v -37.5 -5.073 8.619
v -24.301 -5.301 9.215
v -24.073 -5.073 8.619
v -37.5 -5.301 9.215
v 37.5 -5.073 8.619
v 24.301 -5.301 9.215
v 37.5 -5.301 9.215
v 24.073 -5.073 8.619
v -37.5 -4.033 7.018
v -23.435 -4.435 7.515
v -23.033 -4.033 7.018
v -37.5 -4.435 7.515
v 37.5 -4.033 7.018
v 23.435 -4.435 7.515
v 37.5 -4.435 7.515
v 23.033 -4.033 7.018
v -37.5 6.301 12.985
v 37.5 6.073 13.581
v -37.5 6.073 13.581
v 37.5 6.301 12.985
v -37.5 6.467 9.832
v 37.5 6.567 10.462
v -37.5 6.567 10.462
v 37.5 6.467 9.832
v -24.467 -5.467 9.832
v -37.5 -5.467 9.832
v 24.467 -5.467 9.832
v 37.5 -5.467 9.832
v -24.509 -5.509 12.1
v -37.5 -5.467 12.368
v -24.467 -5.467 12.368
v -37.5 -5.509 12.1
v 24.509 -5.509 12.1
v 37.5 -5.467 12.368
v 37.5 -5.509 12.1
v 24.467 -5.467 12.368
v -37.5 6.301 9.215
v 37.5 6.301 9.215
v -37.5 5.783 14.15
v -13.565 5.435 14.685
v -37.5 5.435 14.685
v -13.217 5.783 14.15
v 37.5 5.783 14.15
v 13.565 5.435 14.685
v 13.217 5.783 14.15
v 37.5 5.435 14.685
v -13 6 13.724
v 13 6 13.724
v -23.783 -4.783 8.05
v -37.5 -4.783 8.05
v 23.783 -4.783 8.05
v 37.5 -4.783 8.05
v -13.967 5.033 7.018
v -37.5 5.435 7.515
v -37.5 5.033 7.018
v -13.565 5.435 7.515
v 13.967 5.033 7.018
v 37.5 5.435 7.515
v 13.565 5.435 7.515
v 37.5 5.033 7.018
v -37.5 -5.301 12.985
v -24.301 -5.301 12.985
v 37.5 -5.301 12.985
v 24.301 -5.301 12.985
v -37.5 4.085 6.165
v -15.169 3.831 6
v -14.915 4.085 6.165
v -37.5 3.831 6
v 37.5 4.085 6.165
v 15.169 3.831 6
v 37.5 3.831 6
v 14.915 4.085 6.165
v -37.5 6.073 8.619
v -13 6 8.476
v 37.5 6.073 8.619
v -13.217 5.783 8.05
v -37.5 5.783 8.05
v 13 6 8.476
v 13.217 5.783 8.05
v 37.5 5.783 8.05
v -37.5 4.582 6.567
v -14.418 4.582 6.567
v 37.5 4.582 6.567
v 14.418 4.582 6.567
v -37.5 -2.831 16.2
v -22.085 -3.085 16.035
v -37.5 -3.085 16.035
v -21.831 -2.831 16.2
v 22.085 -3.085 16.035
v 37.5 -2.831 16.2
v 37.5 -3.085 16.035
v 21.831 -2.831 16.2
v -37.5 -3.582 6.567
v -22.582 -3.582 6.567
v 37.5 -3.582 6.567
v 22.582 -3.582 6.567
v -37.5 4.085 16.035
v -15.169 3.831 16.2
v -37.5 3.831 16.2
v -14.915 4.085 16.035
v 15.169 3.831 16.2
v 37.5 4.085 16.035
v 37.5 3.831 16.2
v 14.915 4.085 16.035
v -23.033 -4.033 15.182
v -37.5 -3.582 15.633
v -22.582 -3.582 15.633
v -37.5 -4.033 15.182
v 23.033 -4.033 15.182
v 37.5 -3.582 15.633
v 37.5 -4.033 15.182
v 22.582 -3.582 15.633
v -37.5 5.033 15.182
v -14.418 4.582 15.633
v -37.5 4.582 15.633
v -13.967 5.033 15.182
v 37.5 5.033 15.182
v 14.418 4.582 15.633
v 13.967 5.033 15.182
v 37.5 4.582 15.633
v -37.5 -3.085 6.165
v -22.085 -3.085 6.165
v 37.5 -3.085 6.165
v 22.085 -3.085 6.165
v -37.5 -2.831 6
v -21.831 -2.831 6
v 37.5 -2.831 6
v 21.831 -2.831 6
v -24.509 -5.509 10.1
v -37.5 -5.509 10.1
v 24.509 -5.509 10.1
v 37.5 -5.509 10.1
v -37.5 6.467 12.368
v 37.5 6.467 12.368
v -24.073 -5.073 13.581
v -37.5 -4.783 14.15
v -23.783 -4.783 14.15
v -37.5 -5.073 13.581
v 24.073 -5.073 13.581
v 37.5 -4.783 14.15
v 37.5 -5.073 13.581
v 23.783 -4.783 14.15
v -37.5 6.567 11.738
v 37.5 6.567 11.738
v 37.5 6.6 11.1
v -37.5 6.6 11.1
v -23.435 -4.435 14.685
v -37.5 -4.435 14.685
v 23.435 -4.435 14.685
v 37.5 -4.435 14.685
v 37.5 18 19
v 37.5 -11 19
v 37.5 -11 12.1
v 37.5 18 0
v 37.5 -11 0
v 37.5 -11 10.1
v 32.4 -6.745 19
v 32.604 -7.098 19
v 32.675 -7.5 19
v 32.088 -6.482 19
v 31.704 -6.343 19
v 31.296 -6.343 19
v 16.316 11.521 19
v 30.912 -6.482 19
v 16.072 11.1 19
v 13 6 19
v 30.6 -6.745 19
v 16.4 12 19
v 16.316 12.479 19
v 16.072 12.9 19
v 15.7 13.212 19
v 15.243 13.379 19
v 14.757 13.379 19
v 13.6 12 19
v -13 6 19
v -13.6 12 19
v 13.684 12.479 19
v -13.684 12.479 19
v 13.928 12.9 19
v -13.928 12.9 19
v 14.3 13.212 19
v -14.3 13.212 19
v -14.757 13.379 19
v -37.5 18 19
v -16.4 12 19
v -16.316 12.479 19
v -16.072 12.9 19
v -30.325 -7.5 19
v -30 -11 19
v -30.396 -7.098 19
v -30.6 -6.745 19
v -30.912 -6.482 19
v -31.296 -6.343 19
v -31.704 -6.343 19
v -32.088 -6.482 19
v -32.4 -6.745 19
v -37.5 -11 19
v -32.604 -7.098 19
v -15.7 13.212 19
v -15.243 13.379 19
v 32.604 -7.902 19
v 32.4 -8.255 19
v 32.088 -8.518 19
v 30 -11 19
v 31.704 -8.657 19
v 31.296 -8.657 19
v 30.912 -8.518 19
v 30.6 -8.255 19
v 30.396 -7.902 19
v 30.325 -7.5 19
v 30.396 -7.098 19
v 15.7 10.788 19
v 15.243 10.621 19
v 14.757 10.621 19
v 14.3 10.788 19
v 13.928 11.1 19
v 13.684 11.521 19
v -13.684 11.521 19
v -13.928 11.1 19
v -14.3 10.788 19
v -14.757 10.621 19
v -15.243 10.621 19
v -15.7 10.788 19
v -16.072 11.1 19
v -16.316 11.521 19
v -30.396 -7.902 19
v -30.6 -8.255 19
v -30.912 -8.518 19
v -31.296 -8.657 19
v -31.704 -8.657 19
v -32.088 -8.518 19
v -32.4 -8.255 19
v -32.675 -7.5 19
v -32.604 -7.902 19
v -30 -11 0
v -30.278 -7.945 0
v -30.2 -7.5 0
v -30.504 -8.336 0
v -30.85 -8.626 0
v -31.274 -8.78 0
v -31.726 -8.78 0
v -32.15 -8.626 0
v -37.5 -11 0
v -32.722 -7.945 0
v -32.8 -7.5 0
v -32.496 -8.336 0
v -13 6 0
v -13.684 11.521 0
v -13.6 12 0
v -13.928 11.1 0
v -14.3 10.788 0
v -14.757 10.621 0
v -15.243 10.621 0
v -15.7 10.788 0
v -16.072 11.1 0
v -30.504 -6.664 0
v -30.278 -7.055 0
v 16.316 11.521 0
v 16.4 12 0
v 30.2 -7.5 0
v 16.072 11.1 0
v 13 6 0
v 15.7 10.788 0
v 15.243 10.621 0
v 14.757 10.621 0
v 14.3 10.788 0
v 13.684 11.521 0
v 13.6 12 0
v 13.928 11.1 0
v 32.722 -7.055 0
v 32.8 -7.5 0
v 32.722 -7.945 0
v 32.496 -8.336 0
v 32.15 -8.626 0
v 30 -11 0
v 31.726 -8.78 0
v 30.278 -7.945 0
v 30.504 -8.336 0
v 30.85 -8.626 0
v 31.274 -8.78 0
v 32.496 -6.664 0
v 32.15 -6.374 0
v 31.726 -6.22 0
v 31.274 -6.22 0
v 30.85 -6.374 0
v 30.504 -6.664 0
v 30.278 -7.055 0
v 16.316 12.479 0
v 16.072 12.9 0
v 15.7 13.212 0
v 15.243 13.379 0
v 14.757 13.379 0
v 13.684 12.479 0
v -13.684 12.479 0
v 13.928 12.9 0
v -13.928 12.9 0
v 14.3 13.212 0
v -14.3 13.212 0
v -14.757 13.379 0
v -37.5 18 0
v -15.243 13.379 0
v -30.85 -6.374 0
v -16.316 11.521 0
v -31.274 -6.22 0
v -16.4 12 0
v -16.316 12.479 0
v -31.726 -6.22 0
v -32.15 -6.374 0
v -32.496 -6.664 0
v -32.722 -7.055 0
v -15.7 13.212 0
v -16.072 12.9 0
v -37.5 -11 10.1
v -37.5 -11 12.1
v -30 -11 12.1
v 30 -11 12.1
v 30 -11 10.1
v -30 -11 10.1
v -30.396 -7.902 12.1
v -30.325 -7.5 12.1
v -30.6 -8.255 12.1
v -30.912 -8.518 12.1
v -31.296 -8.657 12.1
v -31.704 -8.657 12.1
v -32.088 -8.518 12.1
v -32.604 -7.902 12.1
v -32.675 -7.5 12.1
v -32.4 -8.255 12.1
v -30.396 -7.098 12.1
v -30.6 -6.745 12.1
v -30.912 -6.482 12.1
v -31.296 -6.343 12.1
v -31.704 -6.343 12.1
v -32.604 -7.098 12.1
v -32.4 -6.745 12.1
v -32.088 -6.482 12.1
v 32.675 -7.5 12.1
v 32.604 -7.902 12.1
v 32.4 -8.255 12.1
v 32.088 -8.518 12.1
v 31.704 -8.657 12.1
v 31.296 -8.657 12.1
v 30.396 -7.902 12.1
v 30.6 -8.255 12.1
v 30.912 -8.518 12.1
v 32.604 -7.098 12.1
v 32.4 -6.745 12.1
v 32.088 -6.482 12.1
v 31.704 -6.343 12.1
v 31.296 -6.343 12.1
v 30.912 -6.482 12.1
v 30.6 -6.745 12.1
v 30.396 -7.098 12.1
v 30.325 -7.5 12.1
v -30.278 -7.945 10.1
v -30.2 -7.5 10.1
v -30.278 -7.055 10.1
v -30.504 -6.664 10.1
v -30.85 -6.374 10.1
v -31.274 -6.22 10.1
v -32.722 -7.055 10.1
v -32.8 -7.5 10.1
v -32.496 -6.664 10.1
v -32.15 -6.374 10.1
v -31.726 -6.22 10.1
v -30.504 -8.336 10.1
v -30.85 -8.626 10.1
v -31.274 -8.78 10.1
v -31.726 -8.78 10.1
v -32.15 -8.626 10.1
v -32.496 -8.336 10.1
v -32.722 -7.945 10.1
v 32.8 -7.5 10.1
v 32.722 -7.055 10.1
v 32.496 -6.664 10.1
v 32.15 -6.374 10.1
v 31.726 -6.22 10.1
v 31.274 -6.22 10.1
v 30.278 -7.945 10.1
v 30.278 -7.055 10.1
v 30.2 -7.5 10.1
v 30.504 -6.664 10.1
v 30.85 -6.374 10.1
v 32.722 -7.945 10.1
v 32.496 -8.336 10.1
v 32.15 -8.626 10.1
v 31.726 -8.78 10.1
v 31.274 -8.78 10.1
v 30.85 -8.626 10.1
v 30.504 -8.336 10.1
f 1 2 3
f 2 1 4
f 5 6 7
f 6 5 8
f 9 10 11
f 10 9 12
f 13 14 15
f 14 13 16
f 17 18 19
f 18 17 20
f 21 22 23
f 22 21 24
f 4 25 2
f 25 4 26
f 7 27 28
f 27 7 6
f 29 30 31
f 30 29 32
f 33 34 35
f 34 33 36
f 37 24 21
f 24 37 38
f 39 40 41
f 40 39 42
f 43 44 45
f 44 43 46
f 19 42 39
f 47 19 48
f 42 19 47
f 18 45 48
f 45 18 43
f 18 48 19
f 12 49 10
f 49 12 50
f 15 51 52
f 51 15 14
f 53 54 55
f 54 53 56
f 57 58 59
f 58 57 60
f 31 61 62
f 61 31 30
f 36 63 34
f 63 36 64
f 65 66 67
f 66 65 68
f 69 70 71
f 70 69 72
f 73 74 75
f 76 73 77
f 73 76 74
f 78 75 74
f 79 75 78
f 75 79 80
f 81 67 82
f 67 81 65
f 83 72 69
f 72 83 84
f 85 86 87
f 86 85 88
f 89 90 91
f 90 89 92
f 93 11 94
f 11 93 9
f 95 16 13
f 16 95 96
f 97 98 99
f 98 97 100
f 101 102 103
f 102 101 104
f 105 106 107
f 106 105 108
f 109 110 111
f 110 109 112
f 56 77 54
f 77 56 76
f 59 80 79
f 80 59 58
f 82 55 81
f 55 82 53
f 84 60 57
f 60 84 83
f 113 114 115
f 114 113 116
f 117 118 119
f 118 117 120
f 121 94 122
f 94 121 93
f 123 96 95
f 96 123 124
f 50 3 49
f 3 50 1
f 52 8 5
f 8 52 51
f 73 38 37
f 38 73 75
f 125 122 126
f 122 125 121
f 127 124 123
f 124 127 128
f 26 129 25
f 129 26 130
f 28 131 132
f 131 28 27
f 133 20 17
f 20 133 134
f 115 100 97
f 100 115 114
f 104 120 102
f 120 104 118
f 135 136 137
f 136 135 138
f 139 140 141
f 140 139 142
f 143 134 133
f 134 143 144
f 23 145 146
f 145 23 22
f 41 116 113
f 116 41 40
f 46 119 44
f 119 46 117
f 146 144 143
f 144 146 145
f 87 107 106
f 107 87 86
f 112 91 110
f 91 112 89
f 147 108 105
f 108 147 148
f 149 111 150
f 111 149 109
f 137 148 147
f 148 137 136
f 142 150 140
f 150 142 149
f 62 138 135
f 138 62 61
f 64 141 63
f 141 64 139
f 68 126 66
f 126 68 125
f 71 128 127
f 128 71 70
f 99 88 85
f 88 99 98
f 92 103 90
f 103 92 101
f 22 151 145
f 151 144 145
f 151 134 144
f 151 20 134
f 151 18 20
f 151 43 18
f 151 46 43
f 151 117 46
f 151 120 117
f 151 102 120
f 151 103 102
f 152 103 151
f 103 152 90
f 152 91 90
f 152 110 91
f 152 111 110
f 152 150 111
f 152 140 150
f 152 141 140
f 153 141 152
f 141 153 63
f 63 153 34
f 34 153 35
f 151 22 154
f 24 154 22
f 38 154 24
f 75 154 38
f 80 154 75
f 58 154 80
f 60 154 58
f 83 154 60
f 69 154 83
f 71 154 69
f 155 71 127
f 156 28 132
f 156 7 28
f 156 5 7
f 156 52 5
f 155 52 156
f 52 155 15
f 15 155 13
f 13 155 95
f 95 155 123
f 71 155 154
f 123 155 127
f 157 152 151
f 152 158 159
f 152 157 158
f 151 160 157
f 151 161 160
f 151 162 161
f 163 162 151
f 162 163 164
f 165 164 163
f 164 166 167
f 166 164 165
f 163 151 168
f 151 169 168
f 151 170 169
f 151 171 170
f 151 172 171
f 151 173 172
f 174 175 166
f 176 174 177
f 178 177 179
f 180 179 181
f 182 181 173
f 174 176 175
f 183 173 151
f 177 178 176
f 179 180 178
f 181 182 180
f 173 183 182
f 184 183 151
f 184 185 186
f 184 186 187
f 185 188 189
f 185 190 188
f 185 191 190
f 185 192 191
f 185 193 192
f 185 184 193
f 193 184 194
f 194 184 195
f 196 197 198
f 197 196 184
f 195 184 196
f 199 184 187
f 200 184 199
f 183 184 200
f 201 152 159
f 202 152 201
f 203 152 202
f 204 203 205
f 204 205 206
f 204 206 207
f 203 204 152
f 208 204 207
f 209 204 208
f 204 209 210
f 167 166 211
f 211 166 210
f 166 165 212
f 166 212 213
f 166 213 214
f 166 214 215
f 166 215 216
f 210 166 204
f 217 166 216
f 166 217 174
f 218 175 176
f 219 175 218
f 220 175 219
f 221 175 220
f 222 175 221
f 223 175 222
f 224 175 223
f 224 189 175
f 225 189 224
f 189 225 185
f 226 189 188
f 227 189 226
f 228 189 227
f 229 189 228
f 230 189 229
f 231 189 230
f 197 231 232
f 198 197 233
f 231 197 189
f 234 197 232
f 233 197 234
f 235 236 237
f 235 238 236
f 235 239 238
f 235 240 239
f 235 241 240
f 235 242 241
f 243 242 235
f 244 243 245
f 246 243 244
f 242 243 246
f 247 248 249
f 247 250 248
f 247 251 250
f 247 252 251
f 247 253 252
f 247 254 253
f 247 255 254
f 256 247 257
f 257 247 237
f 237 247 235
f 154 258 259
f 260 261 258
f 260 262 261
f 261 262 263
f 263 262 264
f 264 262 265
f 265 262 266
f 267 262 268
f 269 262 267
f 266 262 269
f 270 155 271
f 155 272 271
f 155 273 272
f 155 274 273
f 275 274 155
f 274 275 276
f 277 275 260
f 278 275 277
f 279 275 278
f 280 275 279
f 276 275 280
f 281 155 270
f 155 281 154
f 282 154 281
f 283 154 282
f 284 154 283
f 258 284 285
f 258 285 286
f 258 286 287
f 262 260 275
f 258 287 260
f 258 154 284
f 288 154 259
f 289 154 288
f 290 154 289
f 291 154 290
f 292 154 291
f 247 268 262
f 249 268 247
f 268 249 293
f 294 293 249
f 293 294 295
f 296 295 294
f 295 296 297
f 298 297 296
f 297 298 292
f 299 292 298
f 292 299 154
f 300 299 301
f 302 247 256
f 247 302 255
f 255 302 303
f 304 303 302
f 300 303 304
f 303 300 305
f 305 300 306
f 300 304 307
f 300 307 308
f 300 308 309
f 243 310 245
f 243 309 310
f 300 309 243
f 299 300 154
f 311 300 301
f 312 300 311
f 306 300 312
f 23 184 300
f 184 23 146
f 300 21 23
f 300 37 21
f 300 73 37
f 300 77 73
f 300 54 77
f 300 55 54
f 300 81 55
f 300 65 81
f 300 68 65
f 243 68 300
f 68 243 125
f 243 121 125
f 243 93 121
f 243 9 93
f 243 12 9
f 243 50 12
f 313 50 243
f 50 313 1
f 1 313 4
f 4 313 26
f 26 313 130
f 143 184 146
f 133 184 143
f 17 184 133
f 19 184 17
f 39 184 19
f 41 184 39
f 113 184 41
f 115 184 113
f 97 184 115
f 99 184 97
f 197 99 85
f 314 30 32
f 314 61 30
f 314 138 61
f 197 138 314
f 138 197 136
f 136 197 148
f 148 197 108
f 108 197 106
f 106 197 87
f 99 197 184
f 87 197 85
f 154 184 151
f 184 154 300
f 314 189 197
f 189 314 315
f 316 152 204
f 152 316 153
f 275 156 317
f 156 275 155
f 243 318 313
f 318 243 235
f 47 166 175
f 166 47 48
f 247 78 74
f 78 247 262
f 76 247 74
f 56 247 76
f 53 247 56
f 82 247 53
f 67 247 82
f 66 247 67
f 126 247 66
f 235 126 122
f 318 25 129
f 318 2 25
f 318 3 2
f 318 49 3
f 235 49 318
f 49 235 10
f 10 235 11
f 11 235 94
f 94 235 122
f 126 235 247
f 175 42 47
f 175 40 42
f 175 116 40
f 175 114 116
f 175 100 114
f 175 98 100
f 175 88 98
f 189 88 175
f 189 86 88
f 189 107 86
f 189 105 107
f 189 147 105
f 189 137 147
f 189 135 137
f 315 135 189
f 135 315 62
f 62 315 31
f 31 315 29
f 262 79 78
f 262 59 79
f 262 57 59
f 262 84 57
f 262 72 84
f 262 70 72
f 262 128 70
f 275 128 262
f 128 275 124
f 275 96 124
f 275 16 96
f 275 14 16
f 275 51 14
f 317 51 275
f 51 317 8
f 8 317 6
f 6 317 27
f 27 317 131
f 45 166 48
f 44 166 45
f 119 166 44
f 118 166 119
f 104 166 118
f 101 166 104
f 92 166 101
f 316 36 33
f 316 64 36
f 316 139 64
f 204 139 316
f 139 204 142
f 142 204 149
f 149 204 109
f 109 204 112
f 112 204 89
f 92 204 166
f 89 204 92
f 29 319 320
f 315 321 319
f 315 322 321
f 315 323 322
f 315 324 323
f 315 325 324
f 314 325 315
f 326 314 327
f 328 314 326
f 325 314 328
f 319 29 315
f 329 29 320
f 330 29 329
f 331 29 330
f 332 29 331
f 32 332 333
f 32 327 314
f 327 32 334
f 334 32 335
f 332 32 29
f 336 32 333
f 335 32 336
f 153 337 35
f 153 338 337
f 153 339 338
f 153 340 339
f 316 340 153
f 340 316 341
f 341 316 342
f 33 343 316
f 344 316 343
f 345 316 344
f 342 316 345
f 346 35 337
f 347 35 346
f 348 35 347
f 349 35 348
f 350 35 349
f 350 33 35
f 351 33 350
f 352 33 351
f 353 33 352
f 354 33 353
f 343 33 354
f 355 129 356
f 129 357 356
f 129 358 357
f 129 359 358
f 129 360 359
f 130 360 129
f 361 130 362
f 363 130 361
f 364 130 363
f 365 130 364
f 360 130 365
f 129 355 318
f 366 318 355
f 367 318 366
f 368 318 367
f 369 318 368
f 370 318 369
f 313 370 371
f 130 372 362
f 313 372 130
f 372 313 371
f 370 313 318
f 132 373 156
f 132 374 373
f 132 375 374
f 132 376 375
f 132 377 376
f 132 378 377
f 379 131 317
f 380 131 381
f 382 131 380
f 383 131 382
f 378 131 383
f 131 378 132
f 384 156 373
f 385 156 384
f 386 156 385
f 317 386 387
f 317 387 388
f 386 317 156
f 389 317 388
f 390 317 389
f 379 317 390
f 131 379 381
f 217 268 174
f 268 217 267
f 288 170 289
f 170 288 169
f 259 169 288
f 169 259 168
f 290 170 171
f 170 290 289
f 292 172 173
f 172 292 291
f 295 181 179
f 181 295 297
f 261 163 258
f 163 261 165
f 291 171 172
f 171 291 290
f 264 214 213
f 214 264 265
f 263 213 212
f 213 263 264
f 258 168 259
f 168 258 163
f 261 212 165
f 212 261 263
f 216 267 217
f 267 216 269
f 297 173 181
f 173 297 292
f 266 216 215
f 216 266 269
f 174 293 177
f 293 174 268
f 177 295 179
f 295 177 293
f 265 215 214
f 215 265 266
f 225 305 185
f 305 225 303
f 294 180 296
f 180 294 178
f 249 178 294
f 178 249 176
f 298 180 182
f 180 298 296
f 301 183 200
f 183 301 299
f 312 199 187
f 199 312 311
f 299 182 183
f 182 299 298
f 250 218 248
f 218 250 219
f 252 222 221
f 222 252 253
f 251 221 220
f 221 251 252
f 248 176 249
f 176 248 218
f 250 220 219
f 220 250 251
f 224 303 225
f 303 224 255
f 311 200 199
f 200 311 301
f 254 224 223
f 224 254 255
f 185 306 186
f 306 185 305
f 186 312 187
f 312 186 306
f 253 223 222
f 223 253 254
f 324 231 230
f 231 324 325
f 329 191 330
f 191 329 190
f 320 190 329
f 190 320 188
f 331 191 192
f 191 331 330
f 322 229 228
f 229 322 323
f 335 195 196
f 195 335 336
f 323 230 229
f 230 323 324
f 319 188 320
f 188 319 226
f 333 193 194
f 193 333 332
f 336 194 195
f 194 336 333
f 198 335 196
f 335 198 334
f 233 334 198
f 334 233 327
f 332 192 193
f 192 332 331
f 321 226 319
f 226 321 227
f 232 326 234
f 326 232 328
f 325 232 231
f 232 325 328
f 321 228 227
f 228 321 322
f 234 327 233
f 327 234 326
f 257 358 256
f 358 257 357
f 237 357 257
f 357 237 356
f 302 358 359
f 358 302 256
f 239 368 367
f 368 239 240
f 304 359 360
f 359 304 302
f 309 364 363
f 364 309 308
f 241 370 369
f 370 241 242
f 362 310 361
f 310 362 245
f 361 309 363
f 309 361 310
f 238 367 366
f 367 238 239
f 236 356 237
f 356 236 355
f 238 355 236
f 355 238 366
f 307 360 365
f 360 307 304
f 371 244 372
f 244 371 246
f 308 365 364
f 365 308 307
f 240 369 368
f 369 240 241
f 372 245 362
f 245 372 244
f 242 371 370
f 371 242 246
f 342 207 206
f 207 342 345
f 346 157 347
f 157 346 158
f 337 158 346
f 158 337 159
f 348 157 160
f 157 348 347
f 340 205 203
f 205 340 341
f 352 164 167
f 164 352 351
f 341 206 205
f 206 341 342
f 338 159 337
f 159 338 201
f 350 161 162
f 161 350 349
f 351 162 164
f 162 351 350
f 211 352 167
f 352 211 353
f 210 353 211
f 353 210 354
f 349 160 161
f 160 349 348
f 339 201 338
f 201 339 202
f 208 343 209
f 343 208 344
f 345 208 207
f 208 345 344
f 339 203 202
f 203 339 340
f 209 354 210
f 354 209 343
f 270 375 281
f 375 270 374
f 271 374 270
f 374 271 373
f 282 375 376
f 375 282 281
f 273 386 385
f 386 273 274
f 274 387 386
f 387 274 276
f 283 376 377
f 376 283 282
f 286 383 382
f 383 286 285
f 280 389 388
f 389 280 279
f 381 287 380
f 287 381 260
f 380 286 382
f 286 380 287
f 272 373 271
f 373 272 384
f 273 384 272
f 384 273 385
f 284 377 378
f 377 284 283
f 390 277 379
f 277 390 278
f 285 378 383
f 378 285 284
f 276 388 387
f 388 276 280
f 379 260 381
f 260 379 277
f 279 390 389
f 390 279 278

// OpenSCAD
$fn=18;

difference(){
translate([-37.5,-11,0])cube([75,29,19]);
//translate([-25.5,-17,-1])cube([51,25,24]);

hull(){
translate([-13,-11,-1])cylinder(d=34,h=30,$fn=4);
translate([13,-11,-1])cylinder(d=34,h=30,$fn=4);
}

translate([0,0.5,11.1])rotate([0,90,0])
difference(){
    translate([0,0,-40])cylinder(d=12.2,h=80,$fn=60);
    translate([6.1,0,0])cube([2,16,80],center=true);
    translate([-6.1,0,0])cube([2,16,80],center=true);
}

translate([-40,-20,10.1])cube([80,20,2]);

translate([15,12,-1])cylinder(d=2.8,h=32);    
translate([-15,12,-1])cylinder(d=2.8,h=32); 
translate([-31.5,-7.5,11])cylinder(d=2.35,h=12);
translate([-31.5,-7.5,-1])cylinder(d=2.6,h=12);
translate([31.5,-7.5,11])cylinder(d=2.35,h=12);
translate([31.5,-7.5,-1])cylinder(d=2.6,h=12);
}
